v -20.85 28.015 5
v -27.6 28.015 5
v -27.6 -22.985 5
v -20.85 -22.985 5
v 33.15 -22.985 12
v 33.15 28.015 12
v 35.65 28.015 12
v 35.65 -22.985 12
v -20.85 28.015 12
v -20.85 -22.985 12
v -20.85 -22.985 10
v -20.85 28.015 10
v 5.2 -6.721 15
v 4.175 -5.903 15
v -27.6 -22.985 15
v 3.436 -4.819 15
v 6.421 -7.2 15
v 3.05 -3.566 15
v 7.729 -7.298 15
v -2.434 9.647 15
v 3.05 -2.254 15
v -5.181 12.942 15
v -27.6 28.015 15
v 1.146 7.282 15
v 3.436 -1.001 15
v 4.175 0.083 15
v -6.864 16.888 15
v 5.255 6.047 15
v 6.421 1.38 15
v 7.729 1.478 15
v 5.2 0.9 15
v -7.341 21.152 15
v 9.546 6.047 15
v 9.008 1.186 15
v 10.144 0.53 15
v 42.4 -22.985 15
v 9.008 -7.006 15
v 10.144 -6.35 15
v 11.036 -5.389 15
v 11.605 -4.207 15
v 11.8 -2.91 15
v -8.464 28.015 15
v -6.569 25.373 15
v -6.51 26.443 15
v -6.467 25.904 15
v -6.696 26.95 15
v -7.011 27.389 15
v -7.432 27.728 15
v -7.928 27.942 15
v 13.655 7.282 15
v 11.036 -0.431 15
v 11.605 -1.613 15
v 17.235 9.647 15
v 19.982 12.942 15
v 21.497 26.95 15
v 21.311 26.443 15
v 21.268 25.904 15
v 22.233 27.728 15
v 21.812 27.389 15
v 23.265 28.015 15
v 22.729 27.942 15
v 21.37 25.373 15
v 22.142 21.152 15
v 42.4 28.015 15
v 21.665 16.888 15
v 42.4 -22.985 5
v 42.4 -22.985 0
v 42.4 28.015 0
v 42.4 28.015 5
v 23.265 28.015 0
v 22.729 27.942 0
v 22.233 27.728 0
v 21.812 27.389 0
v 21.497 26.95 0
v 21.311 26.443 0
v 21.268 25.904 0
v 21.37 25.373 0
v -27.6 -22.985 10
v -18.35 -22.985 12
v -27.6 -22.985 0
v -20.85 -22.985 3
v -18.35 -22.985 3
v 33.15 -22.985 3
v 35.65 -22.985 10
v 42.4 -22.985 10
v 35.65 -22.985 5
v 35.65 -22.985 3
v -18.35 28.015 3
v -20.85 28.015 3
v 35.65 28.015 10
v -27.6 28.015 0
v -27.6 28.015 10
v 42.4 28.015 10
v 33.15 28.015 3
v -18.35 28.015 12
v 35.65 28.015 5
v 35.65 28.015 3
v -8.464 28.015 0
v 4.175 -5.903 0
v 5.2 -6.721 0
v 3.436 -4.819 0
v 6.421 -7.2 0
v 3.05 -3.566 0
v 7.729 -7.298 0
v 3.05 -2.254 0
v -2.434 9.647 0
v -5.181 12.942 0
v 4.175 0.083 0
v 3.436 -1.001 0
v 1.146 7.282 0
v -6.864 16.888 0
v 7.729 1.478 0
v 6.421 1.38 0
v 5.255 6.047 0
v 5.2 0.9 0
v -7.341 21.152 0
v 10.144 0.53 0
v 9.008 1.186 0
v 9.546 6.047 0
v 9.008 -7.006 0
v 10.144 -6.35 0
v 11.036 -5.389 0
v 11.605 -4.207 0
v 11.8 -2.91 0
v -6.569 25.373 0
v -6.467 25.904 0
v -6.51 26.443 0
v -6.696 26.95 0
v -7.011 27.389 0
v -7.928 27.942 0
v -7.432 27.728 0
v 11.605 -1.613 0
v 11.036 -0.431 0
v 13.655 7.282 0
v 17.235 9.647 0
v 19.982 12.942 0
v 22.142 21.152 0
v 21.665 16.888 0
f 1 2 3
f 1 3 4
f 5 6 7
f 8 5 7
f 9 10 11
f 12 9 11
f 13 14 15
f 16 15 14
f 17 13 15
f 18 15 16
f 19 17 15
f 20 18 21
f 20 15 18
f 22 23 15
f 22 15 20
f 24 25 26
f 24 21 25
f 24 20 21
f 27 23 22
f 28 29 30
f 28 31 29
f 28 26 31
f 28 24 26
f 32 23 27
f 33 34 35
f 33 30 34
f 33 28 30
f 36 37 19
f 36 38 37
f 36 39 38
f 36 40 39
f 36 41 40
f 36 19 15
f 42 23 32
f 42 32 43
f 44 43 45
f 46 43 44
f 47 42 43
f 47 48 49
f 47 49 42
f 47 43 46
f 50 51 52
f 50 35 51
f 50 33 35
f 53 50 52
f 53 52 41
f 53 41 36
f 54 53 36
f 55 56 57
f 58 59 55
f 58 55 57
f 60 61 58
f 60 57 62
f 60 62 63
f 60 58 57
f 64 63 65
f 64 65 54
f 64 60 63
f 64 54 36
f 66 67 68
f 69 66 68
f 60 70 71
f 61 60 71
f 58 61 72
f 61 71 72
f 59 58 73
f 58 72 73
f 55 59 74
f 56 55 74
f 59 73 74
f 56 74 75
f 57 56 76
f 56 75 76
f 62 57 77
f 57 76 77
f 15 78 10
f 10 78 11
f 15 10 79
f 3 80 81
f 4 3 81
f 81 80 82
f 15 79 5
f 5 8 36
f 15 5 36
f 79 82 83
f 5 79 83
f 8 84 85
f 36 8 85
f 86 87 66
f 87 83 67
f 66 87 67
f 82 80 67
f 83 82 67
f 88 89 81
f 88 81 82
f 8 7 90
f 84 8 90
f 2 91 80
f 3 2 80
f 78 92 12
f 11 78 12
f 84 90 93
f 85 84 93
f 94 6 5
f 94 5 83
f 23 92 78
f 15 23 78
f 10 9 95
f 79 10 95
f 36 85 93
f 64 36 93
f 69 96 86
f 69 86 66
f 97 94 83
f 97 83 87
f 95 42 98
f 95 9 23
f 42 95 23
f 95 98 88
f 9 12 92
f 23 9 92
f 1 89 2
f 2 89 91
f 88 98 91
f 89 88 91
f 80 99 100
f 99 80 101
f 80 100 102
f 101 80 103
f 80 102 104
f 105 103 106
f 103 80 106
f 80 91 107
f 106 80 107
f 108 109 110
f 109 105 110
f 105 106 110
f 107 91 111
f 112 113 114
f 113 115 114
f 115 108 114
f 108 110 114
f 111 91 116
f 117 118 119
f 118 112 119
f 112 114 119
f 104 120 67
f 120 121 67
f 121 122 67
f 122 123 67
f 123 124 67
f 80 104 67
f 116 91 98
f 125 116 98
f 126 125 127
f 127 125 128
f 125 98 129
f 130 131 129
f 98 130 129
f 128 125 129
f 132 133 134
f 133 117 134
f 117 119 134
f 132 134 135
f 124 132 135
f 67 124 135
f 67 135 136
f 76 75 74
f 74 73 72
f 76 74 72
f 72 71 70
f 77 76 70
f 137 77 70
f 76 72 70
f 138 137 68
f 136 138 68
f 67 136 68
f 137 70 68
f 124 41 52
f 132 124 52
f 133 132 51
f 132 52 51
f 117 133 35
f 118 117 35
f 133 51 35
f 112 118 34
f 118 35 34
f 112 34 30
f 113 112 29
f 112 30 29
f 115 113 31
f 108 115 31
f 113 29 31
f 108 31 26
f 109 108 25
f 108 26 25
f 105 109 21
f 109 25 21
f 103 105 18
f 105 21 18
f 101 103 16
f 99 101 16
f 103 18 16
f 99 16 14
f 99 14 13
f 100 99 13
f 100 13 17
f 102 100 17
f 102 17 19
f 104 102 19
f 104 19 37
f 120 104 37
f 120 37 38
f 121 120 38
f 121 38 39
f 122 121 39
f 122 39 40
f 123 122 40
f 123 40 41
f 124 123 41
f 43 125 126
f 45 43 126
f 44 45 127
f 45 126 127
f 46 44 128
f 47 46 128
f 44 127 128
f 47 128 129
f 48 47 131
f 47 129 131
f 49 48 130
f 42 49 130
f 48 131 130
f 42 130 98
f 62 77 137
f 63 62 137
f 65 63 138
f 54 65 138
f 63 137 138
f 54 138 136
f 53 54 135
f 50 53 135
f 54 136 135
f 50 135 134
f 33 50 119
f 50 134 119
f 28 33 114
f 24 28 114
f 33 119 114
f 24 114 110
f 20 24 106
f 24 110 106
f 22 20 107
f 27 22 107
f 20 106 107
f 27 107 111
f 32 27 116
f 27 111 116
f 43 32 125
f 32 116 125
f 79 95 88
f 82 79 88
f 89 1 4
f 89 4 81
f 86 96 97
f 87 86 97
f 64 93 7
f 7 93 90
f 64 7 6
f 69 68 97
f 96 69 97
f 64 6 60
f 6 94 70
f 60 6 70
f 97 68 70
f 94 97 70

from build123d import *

# Parameters (mm, degrees)
BOSS_EXTRUDE1_DEPTH = 15
SKETCH5_R           = 4.4
CUT_EXTRUDE3_DEPTH  = 16
SKETCH3_W           = 16
SKETCH3_H           = 5
SKETCH3_W_2         = 2.5
SKETCH3_H_2         = 9
CUT_EXTRUDE4_DEPTH  = 52


with BuildPart() as part:
    # Sketch2 → Boss-Extrude1 (new body)
    with BuildSketch(Plane.XY):
        with BuildLine():
            Line((42.400497512, 28.014925373), (23.264667046, 28.014925373))
            ThreePointArc((23.264667046, 28.014925373), (21.639308303, 27.180347595), (21.370437848, 25.373134328))
            ThreePointArc((21.370437848, 25.373134328), (7.400497512, 5.889925373), (-6.569442823, 25.373134328))
            ThreePointArc((-6.569442823, 25.373134328), (-6.838313278, 27.180347595), (-8.463672021, 28.014925373))
            Line((-8.463672021, 28.014925373), (-27.599502488, 28.014925373))
            Line((-27.599502488, 28.014925373), (-27.599502488, -22.985074627))
            Line((-27.599502488, -22.985074627), (42.400497512, -22.985074627))
            Line((42.400497512, -22.985074627), (42.400497512, 28.014925373))
        make_face()
    extrude(amount=BOSS_EXTRUDE1_DEPTH)

    # Sketch5 → Cut-Extrude3 (cut, through all)
    with BuildSketch(Plane.XY.offset(15)):
        with Locations((7.400497512, -2.910074627)):
            Circle(SKETCH5_R)
    extrude(amount=-CUT_EXTRUDE3_DEPTH, mode=Mode.SUBTRACT)

    # Sketch3 → Cut-Extrude4 (cut, through all)
    with BuildSketch(Plane(origin=(0, 28.014925373, 0), x_dir=(1, 0, 0), z_dir=(0, 1, 0))):
        with Locations((-27.599502488, -7.5)):
            Rectangle(SKETCH3_W, SKETCH3_H)
        with Locations((42.400497512, -7.5)):
            Rectangle(SKETCH3_W, SKETCH3_H)
        with Locations((-19.599502488, -7.49995864)):
            Rectangle(SKETCH3_W_2, SKETCH3_H_2)
        with Locations((34.400497512, -7.5)):
            Rectangle(SKETCH3_W_2, SKETCH3_H_2)
    extrude(amount=-CUT_EXTRUDE4_DEPTH, mode=Mode.SUBTRACT)


solid = part.part
